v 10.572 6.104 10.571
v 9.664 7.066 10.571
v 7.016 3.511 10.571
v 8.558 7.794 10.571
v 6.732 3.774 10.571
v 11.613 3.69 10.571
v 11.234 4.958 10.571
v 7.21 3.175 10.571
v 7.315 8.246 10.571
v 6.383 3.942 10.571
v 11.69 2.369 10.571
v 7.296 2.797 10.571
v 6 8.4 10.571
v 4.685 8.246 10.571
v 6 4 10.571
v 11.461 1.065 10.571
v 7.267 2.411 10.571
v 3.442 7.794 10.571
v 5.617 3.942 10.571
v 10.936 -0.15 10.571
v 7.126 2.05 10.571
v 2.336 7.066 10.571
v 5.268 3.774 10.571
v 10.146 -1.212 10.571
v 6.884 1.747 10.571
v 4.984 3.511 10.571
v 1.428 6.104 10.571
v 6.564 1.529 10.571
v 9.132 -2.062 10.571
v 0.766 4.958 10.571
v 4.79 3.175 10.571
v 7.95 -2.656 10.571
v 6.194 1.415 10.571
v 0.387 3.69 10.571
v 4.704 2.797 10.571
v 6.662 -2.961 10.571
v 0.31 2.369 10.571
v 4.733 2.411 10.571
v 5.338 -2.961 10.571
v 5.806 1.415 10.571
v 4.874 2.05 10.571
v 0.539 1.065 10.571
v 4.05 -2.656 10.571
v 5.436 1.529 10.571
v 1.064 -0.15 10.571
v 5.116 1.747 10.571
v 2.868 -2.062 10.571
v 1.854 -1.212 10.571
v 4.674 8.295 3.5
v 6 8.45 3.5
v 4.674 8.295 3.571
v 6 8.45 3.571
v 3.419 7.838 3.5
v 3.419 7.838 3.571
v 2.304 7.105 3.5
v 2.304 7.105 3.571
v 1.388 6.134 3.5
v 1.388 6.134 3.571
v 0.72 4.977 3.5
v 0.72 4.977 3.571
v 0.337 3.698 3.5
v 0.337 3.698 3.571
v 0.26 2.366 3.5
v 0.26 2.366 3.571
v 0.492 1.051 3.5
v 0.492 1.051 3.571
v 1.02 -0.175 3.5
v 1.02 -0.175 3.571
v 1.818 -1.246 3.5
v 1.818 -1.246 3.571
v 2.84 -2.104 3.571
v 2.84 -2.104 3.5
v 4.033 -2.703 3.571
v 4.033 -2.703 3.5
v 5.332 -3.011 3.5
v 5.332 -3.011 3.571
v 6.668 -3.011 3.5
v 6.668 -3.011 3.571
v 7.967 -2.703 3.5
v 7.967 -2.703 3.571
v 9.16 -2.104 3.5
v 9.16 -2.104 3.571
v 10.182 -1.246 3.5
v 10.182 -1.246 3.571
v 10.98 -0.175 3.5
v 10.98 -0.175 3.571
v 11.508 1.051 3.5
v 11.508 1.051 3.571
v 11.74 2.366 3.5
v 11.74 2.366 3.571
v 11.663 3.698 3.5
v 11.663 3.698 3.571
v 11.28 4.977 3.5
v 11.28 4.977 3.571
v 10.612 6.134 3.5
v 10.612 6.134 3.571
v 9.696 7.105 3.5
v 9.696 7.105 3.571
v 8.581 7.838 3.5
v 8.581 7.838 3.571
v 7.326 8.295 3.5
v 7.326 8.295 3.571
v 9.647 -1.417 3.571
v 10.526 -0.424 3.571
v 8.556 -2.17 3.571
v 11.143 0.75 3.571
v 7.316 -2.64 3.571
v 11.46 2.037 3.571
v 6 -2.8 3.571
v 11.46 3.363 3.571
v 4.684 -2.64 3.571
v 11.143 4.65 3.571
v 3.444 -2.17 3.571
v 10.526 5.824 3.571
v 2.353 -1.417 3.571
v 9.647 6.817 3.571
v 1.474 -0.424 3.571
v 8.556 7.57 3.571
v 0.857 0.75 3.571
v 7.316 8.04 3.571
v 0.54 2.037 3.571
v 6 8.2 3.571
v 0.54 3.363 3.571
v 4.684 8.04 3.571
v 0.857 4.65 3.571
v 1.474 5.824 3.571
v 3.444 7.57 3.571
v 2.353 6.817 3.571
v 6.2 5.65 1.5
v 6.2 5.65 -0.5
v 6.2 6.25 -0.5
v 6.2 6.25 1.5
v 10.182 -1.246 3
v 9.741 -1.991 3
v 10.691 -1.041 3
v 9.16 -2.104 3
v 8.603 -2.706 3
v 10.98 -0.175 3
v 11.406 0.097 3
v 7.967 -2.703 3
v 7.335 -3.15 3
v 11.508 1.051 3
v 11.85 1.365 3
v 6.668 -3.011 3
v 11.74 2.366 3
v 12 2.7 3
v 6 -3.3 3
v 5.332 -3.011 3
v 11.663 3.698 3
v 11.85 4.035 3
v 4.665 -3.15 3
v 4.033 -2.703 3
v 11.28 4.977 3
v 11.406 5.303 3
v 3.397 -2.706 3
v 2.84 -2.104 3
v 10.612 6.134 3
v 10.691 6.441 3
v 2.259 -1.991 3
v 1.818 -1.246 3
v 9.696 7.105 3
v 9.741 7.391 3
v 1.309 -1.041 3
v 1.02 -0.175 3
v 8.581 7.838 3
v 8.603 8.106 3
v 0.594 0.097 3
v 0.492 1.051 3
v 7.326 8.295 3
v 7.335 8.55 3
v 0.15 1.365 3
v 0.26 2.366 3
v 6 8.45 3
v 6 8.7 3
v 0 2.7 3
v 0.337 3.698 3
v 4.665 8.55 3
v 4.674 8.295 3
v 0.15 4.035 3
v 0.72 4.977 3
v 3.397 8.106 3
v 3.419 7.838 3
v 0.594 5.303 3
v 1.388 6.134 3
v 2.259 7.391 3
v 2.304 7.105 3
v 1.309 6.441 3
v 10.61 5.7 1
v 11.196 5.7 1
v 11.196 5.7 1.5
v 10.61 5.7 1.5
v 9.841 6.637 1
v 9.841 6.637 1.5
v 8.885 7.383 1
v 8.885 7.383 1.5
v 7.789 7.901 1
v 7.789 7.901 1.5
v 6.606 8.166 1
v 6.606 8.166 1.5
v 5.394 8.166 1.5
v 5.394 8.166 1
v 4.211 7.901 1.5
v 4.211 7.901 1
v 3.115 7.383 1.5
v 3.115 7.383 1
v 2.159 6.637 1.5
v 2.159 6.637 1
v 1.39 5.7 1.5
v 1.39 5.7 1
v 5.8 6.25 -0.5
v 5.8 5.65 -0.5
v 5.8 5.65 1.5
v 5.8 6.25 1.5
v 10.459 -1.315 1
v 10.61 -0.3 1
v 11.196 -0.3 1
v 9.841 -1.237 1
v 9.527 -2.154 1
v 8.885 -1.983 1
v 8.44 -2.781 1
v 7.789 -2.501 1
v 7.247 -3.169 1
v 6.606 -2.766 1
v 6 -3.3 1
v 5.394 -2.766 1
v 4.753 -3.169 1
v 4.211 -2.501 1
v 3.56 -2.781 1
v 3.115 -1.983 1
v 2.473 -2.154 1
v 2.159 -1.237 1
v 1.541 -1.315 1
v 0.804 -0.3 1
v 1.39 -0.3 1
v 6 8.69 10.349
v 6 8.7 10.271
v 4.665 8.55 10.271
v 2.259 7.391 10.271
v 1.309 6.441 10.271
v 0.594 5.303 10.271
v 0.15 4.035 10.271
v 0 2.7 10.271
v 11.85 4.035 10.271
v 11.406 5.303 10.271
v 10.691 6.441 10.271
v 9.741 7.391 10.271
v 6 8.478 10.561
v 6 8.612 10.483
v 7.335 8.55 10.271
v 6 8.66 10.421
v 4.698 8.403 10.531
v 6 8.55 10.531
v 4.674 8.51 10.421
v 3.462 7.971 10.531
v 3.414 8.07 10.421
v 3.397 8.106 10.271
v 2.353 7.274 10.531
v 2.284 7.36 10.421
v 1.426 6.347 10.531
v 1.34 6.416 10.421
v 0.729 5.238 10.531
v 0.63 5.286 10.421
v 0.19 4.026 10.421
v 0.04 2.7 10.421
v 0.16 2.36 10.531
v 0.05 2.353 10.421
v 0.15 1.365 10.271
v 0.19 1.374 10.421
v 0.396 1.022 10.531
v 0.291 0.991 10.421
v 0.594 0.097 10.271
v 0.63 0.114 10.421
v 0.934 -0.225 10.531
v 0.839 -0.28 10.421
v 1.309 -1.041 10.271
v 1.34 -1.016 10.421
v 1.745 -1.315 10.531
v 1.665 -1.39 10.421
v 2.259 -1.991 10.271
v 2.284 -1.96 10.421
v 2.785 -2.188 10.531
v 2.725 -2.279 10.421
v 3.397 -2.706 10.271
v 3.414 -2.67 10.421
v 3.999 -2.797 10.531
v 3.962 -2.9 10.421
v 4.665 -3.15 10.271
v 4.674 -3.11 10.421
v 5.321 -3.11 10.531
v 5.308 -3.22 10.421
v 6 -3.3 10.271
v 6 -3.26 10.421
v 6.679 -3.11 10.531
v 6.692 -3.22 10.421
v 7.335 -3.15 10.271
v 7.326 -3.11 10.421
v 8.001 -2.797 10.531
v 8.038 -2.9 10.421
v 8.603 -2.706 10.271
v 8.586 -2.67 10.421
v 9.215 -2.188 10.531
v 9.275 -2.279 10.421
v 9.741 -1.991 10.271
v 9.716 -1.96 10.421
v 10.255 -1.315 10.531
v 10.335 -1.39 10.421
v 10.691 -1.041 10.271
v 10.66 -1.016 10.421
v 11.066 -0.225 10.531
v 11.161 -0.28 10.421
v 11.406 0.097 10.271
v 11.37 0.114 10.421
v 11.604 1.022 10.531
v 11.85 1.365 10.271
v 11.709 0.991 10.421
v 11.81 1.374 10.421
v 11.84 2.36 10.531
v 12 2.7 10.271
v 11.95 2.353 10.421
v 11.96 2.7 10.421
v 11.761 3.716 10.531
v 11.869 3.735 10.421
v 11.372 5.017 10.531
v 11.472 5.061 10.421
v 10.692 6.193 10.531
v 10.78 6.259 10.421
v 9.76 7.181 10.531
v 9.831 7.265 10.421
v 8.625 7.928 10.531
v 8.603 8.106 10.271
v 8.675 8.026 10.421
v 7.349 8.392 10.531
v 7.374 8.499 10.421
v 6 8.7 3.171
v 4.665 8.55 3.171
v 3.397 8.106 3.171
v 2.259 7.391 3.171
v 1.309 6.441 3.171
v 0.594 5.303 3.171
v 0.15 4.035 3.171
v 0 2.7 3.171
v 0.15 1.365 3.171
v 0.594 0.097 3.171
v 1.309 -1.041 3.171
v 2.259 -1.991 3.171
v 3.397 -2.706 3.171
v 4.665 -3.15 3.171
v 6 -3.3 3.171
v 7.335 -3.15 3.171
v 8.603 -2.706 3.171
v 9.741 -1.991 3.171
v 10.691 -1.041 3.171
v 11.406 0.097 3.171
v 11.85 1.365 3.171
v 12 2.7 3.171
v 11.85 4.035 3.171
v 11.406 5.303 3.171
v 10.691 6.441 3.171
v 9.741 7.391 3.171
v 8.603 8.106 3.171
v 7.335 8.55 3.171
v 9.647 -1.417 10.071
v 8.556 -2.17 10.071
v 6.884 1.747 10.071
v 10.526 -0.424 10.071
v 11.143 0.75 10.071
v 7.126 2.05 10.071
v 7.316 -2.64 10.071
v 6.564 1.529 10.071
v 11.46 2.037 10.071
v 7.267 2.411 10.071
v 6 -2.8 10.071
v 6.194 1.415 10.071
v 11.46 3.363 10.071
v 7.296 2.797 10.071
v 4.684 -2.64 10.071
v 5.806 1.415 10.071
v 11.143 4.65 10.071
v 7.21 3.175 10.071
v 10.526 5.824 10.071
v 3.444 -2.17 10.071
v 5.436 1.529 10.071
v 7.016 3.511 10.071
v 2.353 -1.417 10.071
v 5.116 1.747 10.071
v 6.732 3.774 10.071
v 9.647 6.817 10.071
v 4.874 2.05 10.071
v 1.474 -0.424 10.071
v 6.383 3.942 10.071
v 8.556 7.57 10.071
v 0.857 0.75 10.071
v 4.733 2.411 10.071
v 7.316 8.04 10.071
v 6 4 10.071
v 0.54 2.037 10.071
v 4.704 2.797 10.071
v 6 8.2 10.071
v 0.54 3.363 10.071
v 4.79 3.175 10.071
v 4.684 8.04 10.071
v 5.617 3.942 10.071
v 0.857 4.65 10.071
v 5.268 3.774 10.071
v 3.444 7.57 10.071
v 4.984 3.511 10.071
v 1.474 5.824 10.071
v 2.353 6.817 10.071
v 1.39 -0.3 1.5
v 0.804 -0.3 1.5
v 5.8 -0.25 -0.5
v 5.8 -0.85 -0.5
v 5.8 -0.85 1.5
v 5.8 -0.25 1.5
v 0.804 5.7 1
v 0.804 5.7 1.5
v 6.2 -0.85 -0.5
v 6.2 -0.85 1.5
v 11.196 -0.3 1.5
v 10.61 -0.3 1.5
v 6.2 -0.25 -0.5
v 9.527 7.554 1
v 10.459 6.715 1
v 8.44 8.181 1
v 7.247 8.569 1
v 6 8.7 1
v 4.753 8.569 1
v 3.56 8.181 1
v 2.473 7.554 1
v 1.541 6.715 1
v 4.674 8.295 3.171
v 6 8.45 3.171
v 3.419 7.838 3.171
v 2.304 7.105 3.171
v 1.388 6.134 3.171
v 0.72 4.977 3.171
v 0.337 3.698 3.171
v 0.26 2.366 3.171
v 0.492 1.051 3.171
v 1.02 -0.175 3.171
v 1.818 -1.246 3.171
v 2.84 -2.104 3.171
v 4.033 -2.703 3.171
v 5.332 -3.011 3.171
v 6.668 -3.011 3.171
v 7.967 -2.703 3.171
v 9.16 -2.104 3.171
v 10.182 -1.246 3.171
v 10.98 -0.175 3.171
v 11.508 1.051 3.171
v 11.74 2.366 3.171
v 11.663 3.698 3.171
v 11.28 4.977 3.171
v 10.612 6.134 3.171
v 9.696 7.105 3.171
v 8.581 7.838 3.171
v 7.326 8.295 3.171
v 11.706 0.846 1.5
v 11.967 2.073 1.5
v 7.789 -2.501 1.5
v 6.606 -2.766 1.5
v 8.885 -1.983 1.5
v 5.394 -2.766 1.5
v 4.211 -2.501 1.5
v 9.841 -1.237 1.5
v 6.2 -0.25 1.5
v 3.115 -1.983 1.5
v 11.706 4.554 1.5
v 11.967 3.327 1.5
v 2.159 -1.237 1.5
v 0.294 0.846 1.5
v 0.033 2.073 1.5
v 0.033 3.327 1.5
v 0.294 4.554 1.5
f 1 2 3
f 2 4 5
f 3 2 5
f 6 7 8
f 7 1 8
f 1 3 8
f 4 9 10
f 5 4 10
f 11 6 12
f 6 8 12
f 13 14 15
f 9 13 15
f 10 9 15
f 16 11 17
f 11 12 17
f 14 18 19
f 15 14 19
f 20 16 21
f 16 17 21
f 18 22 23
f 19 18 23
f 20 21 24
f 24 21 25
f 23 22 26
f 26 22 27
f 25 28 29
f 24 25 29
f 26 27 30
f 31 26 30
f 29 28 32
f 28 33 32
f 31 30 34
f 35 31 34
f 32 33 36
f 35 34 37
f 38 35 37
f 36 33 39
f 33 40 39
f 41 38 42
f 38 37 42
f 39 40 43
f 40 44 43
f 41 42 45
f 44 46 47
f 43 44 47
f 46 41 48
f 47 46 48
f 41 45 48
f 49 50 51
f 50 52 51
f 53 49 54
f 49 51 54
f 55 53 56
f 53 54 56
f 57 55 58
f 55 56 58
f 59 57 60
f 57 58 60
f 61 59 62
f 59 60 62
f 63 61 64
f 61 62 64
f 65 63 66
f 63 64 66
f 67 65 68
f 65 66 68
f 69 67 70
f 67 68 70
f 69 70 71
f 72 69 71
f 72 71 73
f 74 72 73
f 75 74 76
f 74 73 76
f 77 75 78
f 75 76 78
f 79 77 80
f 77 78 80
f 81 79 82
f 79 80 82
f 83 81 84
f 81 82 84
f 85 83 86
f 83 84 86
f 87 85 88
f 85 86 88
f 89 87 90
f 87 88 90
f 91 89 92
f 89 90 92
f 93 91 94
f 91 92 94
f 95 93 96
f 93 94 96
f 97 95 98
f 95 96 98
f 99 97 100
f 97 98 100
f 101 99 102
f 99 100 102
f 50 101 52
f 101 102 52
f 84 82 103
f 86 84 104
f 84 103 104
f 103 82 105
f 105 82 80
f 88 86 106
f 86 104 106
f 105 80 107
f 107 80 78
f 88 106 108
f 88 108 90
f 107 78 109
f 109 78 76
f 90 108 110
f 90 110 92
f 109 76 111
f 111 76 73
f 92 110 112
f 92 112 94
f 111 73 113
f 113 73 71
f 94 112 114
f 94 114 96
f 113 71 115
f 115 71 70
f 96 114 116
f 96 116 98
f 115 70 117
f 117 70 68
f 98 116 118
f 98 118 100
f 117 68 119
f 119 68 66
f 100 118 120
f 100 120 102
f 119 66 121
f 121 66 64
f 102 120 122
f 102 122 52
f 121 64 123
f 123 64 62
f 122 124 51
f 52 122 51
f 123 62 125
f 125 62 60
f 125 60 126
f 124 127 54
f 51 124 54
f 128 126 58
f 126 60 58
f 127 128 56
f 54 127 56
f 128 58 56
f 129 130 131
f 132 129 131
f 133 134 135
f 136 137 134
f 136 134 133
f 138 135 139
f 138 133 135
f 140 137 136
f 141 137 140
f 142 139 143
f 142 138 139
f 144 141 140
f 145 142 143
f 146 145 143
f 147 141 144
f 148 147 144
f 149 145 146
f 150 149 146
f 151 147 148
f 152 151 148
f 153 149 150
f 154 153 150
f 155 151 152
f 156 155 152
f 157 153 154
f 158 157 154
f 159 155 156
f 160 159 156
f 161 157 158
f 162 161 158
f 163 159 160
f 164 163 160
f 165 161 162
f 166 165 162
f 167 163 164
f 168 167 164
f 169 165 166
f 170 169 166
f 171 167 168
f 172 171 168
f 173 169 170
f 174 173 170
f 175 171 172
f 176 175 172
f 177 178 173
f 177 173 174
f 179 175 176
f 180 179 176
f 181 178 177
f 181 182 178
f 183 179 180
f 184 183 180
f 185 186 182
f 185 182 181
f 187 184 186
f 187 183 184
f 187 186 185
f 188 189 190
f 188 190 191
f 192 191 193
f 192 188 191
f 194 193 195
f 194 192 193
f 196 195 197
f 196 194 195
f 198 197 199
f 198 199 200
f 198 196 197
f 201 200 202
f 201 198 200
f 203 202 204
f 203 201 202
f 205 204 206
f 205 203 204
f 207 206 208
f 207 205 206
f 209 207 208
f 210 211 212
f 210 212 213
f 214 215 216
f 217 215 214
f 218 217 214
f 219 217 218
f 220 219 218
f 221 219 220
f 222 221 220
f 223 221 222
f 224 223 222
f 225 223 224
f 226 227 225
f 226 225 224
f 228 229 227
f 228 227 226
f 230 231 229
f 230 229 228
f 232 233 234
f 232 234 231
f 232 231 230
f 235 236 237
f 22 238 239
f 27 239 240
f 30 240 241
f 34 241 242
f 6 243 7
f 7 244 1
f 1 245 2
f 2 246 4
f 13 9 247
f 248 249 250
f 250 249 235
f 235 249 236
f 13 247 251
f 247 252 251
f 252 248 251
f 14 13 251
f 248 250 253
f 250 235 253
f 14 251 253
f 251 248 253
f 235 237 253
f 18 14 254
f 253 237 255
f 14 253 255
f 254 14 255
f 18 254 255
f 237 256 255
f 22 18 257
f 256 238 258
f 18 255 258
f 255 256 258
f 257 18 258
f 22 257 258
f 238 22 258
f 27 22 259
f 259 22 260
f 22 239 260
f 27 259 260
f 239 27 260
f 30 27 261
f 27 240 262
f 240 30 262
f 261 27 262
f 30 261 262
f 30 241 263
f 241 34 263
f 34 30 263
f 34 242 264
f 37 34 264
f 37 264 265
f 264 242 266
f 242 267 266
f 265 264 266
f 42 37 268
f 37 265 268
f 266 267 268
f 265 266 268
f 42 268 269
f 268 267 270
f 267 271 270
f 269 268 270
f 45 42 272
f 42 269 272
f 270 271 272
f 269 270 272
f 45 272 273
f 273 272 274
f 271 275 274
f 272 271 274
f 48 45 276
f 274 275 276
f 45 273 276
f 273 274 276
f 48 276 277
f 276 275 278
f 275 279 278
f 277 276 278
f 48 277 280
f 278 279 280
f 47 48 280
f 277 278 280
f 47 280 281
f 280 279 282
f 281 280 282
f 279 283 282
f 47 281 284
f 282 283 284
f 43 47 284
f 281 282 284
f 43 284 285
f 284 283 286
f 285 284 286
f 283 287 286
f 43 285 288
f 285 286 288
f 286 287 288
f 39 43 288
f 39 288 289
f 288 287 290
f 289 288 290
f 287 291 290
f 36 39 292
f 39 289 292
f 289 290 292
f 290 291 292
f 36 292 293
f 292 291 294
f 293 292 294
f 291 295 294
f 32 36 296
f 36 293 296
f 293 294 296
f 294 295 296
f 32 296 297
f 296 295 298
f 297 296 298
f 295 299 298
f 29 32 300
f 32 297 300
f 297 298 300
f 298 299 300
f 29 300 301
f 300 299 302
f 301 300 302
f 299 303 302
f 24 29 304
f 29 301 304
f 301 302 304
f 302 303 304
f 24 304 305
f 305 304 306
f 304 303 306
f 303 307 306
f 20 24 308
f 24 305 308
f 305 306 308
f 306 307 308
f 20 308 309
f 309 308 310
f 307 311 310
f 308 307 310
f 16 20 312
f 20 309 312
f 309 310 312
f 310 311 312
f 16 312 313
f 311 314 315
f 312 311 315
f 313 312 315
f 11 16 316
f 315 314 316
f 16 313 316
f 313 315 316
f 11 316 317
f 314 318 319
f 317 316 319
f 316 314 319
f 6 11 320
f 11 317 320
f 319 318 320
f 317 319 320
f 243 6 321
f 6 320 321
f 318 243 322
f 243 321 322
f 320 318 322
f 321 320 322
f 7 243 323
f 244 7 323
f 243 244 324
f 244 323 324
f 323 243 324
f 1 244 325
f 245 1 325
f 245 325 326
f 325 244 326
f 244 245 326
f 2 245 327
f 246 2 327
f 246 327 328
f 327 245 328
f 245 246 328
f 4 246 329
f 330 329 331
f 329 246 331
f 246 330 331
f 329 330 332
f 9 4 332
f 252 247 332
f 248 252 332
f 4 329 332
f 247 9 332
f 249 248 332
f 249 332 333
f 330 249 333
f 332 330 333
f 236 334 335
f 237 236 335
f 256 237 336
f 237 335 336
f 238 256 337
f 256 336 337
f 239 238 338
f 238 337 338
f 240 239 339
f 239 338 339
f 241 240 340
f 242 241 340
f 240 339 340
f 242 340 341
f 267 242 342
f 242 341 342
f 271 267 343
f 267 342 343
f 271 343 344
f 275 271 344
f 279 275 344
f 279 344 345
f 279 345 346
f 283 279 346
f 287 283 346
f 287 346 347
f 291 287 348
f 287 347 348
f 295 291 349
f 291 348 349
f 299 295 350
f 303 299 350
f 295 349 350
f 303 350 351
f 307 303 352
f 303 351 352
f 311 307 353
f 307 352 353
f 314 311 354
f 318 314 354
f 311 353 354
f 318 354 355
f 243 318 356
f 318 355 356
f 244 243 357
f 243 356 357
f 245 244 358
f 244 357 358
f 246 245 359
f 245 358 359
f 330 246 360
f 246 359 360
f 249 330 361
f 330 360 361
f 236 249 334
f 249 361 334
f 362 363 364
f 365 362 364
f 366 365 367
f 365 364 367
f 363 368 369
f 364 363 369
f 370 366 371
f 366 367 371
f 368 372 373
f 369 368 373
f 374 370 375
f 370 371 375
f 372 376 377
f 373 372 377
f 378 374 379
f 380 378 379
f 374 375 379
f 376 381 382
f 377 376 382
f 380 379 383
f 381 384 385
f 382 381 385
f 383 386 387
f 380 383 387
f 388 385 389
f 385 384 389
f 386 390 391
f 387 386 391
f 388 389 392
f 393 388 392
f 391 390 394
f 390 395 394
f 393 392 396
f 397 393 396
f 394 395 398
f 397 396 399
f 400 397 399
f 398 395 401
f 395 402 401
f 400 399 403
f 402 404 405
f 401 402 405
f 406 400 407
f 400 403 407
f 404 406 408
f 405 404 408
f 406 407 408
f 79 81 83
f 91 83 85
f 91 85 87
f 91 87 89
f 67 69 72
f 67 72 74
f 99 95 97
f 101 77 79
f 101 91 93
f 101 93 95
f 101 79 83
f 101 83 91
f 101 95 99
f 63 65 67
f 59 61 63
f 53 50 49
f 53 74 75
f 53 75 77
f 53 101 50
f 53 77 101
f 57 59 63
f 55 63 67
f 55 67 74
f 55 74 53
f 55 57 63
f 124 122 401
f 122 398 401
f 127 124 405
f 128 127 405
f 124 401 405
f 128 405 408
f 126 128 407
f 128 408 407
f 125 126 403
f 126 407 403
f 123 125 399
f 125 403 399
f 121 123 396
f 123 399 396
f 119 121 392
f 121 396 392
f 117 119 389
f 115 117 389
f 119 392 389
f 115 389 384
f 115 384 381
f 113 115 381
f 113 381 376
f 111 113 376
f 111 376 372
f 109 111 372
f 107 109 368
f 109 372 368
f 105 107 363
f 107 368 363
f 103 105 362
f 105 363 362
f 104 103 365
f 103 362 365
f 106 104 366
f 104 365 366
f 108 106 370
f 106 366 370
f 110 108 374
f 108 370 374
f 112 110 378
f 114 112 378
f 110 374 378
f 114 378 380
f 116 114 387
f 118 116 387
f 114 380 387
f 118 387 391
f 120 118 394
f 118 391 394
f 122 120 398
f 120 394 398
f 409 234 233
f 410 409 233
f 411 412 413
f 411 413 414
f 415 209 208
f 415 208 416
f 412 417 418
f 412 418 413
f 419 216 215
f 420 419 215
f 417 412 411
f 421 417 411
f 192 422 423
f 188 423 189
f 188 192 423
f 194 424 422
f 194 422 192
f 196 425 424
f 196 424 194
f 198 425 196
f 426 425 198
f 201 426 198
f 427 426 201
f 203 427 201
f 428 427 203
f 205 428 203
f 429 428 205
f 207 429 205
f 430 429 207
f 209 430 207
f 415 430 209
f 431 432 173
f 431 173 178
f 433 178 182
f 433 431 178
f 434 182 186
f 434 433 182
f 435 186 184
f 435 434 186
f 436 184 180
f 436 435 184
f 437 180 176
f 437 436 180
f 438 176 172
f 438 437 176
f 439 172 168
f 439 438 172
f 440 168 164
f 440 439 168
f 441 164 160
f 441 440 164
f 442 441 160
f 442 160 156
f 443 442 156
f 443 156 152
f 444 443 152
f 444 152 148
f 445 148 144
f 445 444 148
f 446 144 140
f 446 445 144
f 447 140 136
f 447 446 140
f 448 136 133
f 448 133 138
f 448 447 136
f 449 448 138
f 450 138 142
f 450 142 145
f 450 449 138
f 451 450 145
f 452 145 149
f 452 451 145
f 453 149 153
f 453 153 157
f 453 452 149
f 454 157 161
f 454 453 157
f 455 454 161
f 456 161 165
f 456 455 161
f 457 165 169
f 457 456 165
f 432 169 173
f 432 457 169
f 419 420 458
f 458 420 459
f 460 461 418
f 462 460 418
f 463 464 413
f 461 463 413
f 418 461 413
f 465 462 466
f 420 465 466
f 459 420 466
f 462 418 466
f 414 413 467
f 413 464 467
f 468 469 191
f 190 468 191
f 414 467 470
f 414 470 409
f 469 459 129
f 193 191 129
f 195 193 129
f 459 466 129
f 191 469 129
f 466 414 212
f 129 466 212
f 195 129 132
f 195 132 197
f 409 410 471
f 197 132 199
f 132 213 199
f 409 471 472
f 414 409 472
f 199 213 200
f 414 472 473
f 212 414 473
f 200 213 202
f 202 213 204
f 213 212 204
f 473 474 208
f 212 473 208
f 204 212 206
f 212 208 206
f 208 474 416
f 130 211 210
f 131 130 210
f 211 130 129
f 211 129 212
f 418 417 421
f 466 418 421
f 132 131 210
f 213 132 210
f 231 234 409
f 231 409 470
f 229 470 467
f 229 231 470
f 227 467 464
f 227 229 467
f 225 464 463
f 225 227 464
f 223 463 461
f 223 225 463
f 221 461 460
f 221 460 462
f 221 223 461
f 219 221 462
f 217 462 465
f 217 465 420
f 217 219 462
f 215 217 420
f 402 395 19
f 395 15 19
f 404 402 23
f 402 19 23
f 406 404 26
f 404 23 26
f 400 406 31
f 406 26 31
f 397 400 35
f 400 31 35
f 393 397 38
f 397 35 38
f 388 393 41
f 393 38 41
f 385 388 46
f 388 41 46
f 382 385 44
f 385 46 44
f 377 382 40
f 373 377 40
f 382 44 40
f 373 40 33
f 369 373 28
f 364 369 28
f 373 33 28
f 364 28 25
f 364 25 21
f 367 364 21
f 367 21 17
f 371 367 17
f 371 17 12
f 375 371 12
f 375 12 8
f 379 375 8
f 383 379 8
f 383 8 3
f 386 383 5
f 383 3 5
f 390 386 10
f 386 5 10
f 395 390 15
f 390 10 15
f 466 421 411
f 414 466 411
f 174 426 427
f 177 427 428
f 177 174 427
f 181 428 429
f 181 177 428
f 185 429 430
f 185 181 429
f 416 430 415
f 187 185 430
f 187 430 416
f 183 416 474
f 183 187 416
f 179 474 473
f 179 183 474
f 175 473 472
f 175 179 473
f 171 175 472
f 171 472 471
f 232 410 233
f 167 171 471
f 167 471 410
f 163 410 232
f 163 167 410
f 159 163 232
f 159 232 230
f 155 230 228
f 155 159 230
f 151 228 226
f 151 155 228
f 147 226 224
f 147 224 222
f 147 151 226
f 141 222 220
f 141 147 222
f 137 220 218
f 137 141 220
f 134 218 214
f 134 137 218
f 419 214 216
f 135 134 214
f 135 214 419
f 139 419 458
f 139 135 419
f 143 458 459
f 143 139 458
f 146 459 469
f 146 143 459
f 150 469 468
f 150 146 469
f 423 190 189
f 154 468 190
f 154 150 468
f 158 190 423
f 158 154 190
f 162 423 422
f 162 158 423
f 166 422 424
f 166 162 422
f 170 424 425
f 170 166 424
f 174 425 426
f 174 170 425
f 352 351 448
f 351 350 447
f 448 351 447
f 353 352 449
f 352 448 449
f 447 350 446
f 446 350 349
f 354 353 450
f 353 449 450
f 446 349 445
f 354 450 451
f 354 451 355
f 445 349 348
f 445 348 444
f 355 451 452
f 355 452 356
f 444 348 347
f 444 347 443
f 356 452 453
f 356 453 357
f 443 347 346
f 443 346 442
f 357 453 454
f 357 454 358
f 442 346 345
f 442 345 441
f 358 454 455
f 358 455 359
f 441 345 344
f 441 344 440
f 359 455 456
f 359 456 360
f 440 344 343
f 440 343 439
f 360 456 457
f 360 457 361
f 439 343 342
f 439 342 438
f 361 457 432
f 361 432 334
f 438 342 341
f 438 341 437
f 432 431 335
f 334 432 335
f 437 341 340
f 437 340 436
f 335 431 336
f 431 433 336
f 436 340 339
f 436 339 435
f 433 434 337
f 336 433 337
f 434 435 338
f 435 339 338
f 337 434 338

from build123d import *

# Parameters (mm, degrees)
BOX_W                     = 0.6
BOX_H                     = 0.4
BOX_DEPTH                 = 2.5
BOX001_W                  = 0.6
BOX001_H                  = 0.4
BOX001_DEPTH              = 2.5
CYLINDER011_R             = 5.5
CYLINDER011_DEPTH         = 2
BOX002_W                  = 6
BOX002_H                  = 15
BOX002_DEPTH              = 0.5
FILLET006_R               = 0.3
FUSION004_PLACEMENT_ANGLE = 90


with BuildPart() as cubo001:
    # Box → Box (new body)
    with BuildSketch(Plane(origin=(2.95, -0.2, -2), x_dir=(1, 0, 0), z_dir=(0, 0, 1))):
        with Locations((0.3, 0.2)):
            Rectangle(BOX_W, BOX_H)
    extrude(amount=BOX_DEPTH)


with BuildPart() as cubo002:
    # Box001 → Box001 (new body)
    with BuildSketch(Plane(origin=(-3.55, -0.2, -2), x_dir=(1, 0, 0), z_dir=(0, 0, 1))):
        with Locations((0.3, 0.2)):
            Rectangle(BOX001_W, BOX001_H)
    extrude(amount=BOX001_DEPTH)


with BuildPart() as interior:
    # Cylinder011 → Cylinder011 (new body)
    with BuildSketch(Plane.XY):
        Circle(CYLINDER011_R)
    extrude(amount=CYLINDER011_DEPTH)

    # Fusion: union Cubo001, Cubo002
    add(cubo001.part)
    add(cubo002.part)


with BuildPart() as interior_1:
    # Fusion placement: moved
    add(interior.part.moved(Location((0, 0, 0.5))))


with BuildPart() as cubo:
    # Box002 → Box002 (new body)
    with BuildSketch(Plane(origin=(-3, -7, 0), x_dir=(1, 0, 0), z_dir=(0, 0, 1))):
        with Locations((3, 7.5)):
            Rectangle(BOX002_W, BOX002_H)
    extrude(amount=BOX002_DEPTH)


with BuildPart() as aroinferior:
    # Sketch004 → Revolution001 (revolve)
    with BuildSketch(Plane.XZ):
        Polygon((5.5, 2.5), (5.5, 0), (6, 0), (6, 2), (5.75, 2), (5.75, 2.5), align=None)
    revolve(axis=Axis((0, 0, 0), (0, 0, 1)))

    # Cut013: cut Cubo
    add(cubo.part, mode=Mode.SUBTRACT)


with BuildPart() as buzzersensor:
    # Sketch003 → Revolution (revolve)
    with BuildSketch(Plane.XZ):
        Polygon((1.3, 9.57124), (6, 9.57124), (6, 2.17124), (5.75, 2.17124), (5.75, 2.57124), (5.5, 2.57124), (5.5, 9.07124), (1.3, 9.07124), align=None)
    revolve(axis=Axis((0, 0, 0), (0, 0, 1)))

    # Fillet006
    fillet006_edges = [buzzersensor.edges().sort_by_distance(p)[0] for p in [
        (-6, 0, 9.57124),
    ]]
    fillet(fillet006_edges, radius=FILLET006_R)

    # Fusion004: union Interior, AroInferior
    add(interior_1.part)
    add(aroinferior.part)


with BuildPart() as buzzersensor_1:
    # Fusion004 placement: moved
    add(buzzersensor.part.moved(Location((6, 2.7, 1))).rotate(Axis((6, 2.7, 1), (0, 0, 1)), FUSION004_PLACEMENT_ANGLE))


solid = buzzersensor_1.part
